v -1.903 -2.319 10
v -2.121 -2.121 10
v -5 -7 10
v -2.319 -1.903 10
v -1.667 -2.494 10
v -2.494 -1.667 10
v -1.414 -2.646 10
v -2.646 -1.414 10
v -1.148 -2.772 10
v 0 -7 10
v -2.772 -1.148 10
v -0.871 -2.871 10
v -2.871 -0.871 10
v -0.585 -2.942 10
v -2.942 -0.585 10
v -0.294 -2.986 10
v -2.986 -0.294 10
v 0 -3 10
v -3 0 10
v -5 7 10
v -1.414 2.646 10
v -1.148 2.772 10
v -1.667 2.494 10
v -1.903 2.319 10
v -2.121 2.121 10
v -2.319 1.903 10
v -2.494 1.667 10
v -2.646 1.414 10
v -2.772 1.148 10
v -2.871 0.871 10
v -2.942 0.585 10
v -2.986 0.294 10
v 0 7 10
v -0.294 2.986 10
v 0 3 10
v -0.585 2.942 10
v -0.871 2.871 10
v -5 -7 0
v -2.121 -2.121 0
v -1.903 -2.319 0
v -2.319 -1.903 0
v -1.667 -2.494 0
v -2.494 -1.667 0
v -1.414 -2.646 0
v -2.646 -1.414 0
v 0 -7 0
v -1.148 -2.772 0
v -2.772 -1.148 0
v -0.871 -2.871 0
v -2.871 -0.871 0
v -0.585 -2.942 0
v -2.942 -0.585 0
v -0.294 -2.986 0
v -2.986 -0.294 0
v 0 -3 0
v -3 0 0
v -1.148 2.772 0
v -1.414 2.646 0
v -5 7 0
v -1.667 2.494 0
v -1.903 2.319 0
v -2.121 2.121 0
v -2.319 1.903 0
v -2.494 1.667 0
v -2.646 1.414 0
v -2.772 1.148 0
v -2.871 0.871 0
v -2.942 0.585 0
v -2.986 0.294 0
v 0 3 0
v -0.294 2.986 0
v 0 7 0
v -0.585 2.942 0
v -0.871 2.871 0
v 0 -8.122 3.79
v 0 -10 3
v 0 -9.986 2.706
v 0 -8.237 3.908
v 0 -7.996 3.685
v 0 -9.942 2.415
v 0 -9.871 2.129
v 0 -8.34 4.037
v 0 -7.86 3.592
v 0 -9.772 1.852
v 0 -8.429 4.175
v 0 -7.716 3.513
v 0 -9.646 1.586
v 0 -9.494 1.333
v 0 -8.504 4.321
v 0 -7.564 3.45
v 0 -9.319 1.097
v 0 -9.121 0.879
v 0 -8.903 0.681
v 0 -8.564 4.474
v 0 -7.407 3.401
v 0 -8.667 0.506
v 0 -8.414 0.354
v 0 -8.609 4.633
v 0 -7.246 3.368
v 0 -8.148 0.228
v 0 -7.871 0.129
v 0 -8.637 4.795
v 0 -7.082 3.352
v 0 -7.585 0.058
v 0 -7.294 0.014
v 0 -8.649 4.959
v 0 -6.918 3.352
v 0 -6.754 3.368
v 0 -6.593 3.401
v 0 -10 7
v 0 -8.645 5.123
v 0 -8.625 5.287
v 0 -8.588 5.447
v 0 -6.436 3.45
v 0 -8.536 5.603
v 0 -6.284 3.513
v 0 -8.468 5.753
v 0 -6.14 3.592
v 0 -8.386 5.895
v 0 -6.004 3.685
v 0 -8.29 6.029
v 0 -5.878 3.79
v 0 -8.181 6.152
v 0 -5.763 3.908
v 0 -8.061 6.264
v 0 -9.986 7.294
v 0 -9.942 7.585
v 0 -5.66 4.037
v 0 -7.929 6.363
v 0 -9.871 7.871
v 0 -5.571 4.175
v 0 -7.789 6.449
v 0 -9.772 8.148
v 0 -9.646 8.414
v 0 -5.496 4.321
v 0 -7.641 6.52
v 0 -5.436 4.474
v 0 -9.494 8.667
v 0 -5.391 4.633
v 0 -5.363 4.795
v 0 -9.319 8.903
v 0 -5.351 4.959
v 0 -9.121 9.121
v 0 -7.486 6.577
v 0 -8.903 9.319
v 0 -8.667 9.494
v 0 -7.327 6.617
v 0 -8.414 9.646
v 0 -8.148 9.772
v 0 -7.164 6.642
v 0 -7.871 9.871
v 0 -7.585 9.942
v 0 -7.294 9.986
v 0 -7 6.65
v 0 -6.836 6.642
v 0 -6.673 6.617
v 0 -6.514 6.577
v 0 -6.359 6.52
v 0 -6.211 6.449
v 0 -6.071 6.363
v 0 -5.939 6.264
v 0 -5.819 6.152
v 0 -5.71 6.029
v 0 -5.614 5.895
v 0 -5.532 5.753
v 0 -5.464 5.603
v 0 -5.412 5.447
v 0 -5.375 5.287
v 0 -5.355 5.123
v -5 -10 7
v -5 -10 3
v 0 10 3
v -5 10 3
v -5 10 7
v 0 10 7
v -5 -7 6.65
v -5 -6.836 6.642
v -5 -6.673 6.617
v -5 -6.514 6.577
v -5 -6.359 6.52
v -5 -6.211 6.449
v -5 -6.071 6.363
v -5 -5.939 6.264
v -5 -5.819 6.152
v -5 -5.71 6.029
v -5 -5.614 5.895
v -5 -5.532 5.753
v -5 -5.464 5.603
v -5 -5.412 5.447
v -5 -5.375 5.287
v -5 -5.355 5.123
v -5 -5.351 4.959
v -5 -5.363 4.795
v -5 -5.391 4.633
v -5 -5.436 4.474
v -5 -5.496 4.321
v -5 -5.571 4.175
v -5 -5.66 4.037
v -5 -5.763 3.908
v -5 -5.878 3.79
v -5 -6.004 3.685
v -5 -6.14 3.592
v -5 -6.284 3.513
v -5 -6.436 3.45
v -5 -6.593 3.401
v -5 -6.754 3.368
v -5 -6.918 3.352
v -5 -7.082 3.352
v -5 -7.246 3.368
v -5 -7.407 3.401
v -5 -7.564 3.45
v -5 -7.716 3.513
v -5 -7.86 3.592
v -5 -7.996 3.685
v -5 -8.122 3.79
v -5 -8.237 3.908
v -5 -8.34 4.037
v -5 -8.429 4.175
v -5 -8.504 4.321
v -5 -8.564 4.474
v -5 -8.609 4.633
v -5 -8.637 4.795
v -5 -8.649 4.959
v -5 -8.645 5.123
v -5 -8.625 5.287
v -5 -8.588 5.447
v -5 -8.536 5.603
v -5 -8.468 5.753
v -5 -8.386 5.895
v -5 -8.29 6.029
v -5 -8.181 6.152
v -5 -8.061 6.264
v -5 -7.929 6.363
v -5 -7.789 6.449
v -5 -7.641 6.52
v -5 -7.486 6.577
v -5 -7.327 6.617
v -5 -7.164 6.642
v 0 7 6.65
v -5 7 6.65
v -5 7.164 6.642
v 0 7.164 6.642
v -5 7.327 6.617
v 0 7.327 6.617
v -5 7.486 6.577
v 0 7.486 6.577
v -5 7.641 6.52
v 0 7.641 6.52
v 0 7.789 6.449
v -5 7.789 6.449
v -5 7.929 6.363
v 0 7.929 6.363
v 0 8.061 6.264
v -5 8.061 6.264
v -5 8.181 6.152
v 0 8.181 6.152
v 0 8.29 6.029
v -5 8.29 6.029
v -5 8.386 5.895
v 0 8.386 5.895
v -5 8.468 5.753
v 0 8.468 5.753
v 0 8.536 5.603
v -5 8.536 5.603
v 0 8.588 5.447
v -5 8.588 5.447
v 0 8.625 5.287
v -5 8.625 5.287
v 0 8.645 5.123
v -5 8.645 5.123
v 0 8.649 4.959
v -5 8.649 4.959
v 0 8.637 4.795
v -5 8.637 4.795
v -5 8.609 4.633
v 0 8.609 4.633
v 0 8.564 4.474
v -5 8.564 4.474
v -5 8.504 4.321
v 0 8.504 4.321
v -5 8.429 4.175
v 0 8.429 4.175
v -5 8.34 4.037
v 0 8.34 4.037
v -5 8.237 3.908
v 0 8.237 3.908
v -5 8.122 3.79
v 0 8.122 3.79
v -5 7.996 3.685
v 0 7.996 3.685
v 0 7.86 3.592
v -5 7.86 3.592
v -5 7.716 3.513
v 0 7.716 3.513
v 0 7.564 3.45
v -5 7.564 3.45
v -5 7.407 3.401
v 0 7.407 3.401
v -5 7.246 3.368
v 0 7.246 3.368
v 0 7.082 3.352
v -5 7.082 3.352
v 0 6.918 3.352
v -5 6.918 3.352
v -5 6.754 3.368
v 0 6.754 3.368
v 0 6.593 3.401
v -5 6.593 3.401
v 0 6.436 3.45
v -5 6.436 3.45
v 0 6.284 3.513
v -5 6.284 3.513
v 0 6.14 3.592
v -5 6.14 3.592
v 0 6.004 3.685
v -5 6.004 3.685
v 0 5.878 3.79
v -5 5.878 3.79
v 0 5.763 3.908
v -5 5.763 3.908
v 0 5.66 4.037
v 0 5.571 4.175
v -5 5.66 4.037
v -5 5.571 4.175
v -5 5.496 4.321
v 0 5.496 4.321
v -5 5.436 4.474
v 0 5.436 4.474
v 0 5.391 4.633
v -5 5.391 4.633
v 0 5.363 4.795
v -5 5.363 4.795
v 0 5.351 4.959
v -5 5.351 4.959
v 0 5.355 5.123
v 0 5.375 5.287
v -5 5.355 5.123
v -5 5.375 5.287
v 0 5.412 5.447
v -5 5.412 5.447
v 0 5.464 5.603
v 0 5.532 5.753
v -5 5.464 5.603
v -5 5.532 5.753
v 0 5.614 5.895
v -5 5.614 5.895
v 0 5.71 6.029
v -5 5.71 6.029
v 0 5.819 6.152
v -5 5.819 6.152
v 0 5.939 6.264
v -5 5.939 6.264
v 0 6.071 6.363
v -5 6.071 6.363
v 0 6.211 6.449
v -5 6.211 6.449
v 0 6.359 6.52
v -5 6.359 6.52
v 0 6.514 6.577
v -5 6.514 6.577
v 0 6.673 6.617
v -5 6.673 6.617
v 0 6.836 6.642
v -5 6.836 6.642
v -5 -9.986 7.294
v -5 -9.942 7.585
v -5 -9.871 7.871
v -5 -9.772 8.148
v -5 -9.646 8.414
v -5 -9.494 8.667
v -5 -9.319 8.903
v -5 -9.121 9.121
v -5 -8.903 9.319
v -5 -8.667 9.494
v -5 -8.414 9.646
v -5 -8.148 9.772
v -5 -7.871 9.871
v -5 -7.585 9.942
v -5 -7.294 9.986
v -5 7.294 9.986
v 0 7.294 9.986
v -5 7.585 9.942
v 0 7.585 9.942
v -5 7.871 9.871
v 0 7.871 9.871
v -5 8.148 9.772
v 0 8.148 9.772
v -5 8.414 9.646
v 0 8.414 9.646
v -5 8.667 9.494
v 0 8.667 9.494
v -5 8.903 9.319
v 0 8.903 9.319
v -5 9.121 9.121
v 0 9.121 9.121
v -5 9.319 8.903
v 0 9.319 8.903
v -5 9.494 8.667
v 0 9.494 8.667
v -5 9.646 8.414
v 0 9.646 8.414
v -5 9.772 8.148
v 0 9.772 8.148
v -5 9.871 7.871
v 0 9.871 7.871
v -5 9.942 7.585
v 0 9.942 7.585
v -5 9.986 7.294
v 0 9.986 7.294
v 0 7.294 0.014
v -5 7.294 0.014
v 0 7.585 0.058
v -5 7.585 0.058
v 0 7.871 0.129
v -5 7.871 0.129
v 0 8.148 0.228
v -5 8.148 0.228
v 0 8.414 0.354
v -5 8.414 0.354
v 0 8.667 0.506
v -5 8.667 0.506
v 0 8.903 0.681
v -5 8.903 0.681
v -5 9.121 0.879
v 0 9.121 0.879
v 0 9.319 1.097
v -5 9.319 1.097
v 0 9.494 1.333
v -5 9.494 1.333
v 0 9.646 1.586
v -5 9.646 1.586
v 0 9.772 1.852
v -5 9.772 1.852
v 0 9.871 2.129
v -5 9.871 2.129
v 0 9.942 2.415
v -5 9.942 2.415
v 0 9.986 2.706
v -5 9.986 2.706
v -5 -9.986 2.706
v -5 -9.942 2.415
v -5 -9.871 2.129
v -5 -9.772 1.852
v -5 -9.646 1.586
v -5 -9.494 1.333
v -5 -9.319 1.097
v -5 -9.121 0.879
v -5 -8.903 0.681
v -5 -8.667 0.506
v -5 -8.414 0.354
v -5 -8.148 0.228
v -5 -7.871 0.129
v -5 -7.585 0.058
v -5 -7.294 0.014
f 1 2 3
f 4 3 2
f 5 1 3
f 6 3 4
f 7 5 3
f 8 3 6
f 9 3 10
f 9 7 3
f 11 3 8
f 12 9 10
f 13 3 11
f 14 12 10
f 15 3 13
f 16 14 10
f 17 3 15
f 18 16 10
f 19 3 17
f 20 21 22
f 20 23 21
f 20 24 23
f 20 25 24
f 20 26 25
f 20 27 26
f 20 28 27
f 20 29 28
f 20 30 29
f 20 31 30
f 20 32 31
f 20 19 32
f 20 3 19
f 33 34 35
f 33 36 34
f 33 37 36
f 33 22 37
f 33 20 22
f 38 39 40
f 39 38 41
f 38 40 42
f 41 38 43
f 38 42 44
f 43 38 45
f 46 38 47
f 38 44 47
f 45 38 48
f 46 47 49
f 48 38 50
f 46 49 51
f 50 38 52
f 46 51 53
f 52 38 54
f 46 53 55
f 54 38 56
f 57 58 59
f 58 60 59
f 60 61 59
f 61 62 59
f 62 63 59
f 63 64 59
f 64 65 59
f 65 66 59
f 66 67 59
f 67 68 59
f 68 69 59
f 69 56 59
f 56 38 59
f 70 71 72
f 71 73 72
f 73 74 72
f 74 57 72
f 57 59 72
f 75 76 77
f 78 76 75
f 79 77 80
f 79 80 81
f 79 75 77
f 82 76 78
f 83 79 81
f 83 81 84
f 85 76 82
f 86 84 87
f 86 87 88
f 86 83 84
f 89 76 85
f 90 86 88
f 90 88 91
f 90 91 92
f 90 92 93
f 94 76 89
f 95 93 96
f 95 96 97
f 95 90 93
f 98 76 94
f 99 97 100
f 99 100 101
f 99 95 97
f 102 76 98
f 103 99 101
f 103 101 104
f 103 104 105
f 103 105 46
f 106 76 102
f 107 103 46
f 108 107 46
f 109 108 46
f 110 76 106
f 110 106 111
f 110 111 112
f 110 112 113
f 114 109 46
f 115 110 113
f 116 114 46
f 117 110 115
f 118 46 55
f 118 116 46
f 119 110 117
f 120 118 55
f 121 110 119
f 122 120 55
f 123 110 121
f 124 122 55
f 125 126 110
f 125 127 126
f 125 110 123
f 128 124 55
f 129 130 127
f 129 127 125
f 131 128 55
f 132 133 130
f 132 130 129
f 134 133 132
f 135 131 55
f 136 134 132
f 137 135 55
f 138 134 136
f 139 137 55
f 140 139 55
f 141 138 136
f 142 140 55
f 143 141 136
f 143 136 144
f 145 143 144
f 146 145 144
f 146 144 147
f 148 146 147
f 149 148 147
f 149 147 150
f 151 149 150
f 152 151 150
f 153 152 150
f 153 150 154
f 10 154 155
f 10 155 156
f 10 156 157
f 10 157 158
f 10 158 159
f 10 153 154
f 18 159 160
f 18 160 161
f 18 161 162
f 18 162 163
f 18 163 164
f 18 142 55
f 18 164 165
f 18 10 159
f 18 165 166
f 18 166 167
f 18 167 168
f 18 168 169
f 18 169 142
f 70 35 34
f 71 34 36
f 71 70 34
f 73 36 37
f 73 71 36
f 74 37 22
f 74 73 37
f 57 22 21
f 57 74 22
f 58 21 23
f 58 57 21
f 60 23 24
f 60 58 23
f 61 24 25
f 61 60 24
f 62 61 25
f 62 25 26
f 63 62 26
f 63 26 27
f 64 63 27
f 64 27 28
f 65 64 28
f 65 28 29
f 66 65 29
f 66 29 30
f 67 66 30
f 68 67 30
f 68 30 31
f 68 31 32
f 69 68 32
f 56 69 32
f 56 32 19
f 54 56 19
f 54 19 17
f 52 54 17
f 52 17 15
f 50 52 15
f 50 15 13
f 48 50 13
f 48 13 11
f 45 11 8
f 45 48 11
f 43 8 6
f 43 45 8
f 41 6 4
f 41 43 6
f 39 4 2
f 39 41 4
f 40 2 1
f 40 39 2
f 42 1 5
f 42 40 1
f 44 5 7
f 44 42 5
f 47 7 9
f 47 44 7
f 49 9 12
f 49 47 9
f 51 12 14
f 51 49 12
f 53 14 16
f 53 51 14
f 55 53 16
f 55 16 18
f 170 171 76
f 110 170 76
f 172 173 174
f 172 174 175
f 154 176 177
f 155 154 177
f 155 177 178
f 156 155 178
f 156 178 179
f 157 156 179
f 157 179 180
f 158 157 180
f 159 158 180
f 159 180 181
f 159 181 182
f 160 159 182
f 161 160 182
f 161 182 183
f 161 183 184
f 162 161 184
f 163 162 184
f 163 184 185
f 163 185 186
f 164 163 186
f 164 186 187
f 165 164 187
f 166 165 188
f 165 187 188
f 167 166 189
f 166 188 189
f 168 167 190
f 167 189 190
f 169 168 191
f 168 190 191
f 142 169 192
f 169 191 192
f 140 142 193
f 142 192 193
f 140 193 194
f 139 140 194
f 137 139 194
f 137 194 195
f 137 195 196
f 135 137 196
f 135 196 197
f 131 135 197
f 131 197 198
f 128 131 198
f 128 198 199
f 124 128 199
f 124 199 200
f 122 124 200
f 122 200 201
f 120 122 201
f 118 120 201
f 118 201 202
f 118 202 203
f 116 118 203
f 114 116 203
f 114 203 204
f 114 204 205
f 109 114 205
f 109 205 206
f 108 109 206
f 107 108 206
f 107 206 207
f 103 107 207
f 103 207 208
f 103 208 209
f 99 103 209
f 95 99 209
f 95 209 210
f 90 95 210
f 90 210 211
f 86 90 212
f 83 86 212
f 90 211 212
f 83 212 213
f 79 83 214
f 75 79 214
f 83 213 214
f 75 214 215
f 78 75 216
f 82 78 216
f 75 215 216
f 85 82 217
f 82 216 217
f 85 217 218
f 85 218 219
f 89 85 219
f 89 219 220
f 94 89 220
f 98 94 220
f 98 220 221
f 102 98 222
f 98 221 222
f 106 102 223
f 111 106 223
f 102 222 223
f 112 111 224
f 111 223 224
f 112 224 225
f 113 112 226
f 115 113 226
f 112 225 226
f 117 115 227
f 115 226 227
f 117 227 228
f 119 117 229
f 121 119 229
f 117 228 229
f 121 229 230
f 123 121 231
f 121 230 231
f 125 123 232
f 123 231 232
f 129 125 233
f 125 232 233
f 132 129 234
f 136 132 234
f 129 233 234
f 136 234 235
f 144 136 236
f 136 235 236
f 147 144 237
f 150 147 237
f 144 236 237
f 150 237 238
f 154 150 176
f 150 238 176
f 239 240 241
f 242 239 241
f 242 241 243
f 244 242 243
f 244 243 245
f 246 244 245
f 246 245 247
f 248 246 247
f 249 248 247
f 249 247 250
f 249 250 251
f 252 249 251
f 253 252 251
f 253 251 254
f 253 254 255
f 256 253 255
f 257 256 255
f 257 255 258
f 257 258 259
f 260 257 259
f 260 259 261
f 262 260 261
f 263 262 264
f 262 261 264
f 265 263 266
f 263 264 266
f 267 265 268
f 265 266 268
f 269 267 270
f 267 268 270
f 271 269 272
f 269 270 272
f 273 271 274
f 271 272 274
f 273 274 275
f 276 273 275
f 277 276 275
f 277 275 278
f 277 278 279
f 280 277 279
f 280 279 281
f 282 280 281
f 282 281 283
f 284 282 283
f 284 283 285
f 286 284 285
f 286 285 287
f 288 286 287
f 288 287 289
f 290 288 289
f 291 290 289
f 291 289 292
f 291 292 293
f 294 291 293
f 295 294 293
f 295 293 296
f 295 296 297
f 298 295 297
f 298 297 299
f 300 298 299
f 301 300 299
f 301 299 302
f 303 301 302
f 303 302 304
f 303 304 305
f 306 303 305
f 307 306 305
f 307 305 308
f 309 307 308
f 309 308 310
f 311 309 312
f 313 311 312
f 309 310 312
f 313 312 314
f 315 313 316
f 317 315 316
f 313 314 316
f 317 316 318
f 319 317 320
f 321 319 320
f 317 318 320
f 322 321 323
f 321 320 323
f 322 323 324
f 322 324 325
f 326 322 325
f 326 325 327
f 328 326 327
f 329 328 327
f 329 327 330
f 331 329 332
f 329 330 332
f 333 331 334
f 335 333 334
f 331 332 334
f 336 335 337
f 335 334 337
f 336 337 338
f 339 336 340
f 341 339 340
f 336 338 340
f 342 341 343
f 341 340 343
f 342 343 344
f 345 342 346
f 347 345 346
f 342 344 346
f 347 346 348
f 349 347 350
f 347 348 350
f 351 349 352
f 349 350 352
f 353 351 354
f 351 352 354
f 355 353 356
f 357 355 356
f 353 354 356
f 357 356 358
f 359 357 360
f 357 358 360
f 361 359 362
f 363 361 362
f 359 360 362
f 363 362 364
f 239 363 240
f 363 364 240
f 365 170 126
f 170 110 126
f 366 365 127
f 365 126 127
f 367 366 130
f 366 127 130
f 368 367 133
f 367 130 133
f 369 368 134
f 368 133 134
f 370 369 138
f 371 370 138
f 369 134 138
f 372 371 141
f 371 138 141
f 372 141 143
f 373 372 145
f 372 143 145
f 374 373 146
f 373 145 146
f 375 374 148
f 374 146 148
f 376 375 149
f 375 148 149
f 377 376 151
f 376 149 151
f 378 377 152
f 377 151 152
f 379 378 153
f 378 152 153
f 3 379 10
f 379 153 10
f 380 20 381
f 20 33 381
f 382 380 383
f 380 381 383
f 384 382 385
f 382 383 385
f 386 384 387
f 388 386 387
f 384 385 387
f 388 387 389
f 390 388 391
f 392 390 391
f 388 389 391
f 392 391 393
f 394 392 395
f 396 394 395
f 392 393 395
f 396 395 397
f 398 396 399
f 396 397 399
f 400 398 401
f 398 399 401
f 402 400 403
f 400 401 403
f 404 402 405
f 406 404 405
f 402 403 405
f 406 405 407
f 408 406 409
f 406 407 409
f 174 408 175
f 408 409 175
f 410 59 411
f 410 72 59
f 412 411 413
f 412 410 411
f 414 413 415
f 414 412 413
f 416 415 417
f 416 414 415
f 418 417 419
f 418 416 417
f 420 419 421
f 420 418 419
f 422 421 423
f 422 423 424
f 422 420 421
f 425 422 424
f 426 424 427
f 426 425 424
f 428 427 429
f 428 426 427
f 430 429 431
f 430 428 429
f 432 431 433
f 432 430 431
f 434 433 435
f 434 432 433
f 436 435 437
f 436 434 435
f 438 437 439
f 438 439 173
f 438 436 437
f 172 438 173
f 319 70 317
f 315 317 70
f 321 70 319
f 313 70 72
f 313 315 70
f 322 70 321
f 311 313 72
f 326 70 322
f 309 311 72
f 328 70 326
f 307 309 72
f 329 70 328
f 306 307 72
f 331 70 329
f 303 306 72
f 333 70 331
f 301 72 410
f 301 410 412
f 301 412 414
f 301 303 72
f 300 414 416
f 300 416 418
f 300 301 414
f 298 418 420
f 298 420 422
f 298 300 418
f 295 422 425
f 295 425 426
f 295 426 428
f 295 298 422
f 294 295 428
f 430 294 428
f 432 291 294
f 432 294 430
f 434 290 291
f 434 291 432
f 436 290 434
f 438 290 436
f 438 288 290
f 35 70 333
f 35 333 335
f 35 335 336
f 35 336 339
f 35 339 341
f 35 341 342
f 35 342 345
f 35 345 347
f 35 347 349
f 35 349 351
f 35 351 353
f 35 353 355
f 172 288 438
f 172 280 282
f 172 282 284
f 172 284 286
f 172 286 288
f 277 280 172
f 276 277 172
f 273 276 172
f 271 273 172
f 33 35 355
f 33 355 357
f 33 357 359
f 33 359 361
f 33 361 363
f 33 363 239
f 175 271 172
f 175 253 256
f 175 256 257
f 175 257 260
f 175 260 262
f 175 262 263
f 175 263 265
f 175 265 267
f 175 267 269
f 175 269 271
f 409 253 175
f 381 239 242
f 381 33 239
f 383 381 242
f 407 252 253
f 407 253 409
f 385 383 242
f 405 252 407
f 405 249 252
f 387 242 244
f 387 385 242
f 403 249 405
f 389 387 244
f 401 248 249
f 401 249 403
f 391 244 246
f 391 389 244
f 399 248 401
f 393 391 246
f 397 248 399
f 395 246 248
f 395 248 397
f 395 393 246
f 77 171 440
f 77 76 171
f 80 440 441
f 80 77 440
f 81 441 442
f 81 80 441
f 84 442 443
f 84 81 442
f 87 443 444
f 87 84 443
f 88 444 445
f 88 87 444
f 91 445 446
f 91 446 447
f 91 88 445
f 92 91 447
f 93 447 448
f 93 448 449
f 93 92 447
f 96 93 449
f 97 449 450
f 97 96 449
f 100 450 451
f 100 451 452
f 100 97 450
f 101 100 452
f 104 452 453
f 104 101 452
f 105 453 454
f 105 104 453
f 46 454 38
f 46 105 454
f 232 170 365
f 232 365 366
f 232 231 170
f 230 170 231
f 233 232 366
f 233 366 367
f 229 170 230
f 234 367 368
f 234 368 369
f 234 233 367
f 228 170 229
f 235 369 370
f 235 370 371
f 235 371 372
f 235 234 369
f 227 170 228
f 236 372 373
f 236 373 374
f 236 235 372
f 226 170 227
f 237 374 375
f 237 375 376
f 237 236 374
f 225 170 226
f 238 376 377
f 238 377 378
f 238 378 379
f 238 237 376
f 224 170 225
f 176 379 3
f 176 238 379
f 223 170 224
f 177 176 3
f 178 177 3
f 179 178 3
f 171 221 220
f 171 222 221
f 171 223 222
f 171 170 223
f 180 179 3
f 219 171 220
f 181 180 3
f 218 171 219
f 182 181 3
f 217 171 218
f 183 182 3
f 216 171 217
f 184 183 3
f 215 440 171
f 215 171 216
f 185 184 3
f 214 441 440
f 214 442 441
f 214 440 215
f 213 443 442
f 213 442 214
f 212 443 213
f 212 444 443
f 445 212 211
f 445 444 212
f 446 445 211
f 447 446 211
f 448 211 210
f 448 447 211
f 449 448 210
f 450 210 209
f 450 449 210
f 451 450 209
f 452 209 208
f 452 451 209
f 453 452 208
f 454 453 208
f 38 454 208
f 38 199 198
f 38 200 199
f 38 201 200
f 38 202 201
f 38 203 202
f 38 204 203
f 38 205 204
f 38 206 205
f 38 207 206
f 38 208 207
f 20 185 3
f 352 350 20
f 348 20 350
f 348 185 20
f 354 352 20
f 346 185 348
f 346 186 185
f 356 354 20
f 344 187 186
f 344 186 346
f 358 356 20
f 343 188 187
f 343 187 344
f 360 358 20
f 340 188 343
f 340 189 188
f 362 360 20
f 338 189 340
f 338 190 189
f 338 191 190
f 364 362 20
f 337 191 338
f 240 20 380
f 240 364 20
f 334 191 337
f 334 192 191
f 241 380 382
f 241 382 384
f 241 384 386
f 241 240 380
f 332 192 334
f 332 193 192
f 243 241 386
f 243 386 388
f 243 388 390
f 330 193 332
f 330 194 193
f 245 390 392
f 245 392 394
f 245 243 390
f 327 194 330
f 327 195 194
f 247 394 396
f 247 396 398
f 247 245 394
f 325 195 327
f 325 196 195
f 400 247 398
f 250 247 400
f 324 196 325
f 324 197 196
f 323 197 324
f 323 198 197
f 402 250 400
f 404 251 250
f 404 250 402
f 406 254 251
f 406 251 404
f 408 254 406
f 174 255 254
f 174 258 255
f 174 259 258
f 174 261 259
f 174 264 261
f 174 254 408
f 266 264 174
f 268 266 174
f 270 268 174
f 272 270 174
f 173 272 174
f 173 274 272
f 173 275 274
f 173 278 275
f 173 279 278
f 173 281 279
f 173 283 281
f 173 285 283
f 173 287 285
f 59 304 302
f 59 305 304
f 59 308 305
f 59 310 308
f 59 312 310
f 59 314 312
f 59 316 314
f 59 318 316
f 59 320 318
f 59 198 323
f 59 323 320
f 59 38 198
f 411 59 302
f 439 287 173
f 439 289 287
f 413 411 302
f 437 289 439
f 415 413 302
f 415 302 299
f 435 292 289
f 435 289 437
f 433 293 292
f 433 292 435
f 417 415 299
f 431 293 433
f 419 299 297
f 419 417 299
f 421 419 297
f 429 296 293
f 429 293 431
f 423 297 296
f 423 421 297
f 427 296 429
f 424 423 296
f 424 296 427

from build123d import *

# Parameters (mm, degrees)
SKETCH_1_W          = 10
SKETCH_1_H          = 20
SKETCH_1_R          = 3
EXTRUDE_1_DEPTH     = 10
SKETCH_2_R          = 1.65
CUT_EXTRUDE_1_DEPTH = 18.320508076
SKETCH_3_W          = 12.852703923
SKETCH_3_H          = 20.2795508
CUT_EXTRUDE_2_DEPTH = 16
FILLET_1_R          = 3


with BuildPart() as part:
    # 草圖1 → 填料-伸長1 (new body)
    with BuildSketch(Plane.XY):
        Rectangle(SKETCH_1_W, SKETCH_1_H)
        Circle(SKETCH_1_R, mode=Mode.SUBTRACT)
    extrude(amount=EXTRUDE_1_DEPTH)

    # 草圖2 → 除料-伸長1 (cut, through all)
    with BuildSketch(Plane.ZY.offset(5)):
        with Locations((5, 7)):
            Circle(SKETCH_2_R)
        with Locations((5, -7)):
            Circle(SKETCH_2_R)
    extrude(amount=-CUT_EXTRUDE_1_DEPTH, mode=Mode.SUBTRACT)

    # 草圖3 → 除料-伸長2 (cut, through all)
    with BuildSketch(Plane.XY.offset(10)):
        with Locations((6.426351961, -0.1397754)):
            Rectangle(SKETCH_3_W, SKETCH_3_H)
    extrude(amount=-CUT_EXTRUDE_2_DEPTH, mode=Mode.SUBTRACT)

    # 圓角1
    fillet_1_edges = [part.edges().sort_by_distance(p)[0] for p in [
        (-2.5, 10, 0),
        (-2.5, 10, 10),
        (-2.5, -10, 0),
        (-2.5, -10, 10),
    ]]
    fillet(fillet_1_edges, radius=FILLET_1_R)


solid = part.part
